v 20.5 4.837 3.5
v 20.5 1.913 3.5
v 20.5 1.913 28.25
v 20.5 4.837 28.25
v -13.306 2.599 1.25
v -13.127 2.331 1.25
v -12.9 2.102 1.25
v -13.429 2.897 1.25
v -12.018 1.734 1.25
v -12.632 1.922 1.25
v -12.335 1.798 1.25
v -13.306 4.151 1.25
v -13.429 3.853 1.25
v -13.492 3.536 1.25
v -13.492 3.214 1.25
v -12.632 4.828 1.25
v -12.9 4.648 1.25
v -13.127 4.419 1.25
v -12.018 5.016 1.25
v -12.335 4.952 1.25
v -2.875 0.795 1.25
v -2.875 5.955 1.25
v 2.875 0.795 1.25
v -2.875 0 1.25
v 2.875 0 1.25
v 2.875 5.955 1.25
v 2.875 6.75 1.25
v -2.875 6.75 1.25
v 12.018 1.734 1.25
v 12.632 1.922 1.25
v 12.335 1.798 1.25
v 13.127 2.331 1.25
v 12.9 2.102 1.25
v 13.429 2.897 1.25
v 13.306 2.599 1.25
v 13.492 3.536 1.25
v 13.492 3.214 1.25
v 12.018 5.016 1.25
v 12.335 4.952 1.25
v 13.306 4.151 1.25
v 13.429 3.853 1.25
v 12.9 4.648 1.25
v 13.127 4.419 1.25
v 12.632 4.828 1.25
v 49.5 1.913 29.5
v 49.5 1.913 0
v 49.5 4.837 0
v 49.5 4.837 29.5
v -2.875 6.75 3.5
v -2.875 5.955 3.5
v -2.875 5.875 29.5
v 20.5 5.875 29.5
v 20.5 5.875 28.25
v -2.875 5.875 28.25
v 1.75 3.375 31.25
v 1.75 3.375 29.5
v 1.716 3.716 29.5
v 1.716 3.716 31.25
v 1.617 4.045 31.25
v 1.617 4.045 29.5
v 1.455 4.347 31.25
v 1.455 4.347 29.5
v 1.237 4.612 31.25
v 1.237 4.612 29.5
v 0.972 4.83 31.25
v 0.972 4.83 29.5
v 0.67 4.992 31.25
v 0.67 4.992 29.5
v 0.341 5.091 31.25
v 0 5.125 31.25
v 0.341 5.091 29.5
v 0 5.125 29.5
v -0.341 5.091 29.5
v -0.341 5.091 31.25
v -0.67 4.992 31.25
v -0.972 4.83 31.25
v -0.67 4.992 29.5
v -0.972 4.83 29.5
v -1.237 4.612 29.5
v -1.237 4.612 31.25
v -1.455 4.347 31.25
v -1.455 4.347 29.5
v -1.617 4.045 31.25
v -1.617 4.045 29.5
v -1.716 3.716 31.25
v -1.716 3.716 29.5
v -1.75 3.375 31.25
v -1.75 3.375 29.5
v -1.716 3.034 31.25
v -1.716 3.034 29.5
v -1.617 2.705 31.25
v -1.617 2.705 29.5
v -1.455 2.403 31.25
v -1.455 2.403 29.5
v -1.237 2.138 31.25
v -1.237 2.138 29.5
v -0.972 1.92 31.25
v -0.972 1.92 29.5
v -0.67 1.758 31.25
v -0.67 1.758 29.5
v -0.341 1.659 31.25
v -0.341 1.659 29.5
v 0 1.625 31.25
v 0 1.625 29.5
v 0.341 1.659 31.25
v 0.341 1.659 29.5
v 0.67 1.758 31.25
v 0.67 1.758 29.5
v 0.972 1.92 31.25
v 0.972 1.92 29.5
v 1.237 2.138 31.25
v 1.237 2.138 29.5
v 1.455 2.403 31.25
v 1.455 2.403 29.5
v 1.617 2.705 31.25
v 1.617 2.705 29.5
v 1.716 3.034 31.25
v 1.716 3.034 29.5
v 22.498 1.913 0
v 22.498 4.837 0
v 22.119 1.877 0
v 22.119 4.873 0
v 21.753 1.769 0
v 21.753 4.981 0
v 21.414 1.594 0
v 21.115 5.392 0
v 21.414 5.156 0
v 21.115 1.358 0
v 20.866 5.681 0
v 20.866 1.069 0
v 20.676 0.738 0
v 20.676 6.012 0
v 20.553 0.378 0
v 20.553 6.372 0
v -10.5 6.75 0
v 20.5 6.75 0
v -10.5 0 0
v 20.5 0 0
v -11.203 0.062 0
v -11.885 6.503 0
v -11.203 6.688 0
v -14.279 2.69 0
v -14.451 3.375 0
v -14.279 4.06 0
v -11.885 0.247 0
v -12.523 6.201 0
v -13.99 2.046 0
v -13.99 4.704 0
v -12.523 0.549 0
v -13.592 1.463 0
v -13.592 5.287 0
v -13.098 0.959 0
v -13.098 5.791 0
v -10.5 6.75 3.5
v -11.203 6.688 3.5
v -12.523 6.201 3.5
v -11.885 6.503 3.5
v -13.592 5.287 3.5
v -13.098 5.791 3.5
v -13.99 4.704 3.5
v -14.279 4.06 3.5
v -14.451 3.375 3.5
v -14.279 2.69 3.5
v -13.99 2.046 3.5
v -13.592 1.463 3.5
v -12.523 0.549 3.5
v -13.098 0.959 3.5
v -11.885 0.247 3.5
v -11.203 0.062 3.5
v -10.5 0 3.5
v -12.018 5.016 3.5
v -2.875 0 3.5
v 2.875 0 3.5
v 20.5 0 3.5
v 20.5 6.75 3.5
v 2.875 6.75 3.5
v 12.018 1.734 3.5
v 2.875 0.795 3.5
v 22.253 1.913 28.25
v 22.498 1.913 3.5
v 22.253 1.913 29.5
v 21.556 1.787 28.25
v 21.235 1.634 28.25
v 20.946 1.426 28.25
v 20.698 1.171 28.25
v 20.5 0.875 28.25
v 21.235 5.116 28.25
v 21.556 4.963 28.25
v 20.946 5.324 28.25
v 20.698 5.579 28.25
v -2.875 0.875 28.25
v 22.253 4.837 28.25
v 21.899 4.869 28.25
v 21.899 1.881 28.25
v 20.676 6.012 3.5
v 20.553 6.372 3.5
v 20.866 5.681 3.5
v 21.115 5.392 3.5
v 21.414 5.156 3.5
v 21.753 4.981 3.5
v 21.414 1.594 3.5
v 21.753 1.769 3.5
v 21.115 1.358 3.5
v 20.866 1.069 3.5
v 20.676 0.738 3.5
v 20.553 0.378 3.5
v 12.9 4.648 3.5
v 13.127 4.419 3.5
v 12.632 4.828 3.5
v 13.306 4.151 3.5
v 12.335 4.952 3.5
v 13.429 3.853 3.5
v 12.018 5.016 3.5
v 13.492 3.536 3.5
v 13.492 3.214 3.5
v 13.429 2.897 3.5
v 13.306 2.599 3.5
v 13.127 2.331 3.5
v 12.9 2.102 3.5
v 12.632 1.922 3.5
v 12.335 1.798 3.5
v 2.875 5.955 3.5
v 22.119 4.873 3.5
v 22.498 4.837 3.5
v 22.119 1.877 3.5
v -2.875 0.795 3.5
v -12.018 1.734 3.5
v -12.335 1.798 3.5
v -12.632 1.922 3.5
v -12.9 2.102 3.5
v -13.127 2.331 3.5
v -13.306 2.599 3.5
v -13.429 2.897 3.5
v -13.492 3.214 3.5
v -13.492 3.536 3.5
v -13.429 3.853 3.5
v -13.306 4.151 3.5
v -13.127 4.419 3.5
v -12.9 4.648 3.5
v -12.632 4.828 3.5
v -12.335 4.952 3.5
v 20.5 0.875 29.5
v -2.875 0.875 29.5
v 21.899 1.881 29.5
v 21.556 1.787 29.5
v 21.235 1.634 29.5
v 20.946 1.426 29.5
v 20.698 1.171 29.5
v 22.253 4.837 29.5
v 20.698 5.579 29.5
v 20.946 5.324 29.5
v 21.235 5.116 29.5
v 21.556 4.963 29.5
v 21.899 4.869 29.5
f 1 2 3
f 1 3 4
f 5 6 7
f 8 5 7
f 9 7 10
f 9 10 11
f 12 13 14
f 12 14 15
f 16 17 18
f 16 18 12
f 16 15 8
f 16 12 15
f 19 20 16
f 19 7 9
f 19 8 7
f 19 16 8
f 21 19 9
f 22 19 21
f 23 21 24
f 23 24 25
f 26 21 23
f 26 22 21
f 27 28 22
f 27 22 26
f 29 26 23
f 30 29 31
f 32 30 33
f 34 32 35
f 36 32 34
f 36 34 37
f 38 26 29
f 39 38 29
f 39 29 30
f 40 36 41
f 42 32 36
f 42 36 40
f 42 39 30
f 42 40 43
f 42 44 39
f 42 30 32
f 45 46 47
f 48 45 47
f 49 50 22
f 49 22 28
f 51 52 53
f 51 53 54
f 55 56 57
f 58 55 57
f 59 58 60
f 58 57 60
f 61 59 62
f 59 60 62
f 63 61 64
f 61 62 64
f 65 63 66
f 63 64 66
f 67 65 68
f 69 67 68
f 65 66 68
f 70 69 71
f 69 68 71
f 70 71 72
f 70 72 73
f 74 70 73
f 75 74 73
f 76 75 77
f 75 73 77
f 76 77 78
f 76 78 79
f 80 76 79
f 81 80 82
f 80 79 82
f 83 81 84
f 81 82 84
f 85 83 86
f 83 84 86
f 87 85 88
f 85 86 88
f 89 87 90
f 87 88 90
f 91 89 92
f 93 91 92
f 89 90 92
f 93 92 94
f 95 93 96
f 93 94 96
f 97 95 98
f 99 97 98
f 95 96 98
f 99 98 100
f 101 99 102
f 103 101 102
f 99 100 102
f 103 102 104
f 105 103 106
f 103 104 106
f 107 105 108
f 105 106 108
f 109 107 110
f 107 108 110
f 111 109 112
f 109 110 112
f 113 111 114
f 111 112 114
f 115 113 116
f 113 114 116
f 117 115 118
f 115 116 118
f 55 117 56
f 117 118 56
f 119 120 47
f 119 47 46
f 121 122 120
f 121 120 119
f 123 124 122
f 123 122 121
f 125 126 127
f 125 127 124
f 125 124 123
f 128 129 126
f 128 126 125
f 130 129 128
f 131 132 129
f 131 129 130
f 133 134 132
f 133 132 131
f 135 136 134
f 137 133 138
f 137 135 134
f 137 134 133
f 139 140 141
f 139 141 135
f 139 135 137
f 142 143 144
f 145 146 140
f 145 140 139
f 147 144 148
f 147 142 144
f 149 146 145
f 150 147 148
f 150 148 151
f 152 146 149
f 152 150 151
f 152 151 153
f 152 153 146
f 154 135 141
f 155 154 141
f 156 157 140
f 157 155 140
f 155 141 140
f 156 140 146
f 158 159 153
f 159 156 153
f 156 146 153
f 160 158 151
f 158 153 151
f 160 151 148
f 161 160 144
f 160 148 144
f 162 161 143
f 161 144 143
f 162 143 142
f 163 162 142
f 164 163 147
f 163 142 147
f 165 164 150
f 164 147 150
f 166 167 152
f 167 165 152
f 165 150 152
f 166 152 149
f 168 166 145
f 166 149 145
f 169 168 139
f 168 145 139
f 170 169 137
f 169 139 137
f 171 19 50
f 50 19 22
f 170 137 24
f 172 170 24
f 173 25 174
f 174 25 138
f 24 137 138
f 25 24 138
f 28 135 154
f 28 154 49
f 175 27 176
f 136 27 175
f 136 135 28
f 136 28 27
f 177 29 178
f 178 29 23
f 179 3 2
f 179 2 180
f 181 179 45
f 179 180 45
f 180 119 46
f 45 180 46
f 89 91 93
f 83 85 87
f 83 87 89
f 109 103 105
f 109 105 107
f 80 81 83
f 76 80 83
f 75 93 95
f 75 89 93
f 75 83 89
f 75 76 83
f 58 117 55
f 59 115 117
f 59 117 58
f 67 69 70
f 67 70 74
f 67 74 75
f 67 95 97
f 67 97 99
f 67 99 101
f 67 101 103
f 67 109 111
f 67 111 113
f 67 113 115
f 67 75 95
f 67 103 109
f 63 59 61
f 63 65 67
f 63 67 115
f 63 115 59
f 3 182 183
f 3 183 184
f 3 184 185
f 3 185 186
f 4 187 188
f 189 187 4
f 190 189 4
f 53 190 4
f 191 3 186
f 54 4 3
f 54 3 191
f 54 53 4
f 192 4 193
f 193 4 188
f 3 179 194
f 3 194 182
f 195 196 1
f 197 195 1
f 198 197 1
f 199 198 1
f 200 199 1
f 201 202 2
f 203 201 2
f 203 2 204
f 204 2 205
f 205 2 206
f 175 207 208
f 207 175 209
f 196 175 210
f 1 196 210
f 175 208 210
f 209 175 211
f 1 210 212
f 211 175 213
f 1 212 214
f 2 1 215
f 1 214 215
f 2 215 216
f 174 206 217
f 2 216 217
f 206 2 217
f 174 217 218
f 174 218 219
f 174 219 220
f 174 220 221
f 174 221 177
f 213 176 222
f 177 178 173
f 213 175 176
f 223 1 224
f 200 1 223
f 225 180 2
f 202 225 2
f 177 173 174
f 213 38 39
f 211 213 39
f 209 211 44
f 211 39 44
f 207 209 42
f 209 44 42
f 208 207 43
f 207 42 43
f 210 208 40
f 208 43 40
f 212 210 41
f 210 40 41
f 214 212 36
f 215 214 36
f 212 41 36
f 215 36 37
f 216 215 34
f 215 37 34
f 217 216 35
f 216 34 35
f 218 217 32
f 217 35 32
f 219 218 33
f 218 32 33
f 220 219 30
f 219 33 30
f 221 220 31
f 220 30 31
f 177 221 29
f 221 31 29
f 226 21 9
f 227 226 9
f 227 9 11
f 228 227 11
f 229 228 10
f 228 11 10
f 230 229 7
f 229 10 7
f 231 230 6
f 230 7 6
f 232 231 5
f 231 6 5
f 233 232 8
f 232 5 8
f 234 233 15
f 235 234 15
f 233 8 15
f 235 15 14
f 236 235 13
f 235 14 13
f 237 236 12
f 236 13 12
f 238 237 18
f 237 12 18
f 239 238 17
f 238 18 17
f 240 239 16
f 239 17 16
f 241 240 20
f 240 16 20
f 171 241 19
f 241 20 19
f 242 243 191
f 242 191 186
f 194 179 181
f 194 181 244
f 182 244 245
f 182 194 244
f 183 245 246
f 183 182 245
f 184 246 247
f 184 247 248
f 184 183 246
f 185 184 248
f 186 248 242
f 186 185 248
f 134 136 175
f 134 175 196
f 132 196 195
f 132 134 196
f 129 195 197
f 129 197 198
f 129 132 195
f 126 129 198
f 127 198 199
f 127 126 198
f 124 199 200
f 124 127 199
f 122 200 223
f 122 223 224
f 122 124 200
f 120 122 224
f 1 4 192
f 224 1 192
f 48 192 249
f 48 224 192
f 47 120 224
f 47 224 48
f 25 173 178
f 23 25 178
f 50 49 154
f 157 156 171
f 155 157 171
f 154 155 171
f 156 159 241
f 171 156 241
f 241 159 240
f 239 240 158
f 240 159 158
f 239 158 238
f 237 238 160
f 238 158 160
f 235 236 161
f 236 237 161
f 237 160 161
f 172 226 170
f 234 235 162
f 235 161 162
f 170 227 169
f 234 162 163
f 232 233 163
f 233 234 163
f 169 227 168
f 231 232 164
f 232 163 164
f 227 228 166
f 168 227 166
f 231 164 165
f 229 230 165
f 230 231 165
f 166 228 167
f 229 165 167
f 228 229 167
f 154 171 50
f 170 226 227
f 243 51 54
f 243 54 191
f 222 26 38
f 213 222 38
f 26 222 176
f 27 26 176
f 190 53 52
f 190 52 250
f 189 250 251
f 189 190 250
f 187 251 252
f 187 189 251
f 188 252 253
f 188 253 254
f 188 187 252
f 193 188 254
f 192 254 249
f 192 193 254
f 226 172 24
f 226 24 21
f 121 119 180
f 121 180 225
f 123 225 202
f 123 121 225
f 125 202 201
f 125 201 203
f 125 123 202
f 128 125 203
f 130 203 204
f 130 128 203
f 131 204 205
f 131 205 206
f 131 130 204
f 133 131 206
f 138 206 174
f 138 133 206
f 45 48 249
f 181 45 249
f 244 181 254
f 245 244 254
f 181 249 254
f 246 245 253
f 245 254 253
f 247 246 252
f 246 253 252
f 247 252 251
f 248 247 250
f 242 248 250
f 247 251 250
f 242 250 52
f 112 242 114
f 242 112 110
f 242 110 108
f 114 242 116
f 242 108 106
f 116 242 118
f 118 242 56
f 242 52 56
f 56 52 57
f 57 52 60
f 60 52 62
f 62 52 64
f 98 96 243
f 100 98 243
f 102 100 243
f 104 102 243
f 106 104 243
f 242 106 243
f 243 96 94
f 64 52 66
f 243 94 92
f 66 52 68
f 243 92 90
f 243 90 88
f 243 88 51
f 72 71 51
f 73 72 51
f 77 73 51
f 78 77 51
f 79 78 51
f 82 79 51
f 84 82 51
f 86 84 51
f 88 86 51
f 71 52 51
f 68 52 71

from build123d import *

# Parameters (mm, degrees)
SKETCH1_W            = 35
SKETCH1_H            = 6.75
BOSS_EXTRUDE10_DEPTH = 3.5
SKETCH1_16_R         = 0.291434634
BOSS_EXTRUDE15_DEPTH = 1.25
SKETCH1_17_W         = 29
SKETCH1_17_H         = 2.924143722
BOSS_EXTRUDE17_DEPTH = 29.5
BOSS_EXTRUDE18_DEPTH = 1.25
SKETCH2_9_R          = 1.75
BOSS_EXTRUDE19_DEPTH = 1.75
FILLET1_R            = 2
FILLET2_R            = 4
SKETCH3_W            = 5.75
SKETCH3_H            = 0.795101344
CUT_EXTRUDE1_DEPTH   = 2.25


with BuildPart() as part:
    # Sketch1 → Boss-Extrude10 (new body)
    with BuildSketch(Plane.XY):
        with Locations((3, 3.375)):
            Rectangle(SKETCH1_W, SKETCH1_H)
        with BuildLine():
            Line((0, 6.25), (12.018477316, 5.016376067))
            ThreePointArc((12.018477316, 5.016376067), (13.5, 3.375), (12.018477316, 1.733623933))
            Line((12.018477316, 1.733623933), (0, 0.5))
            Line((0, 0.5), (-12.018477316, 1.733623933))
            ThreePointArc((-12.018477316, 1.733623933), (-13.5, 3.375), (-12.018477316, 5.016376067))
            Line((-12.018477316, 5.016376067), (0, 6.25))
        make_face(mode=Mode.SUBTRACT)
    extrude(amount=BOSS_EXTRUDE10_DEPTH)

    # Sketch1<16> → Boss-Extrude15 (add)
    # profile 1 of 9: a face of its own
    with BuildSketch(Plane.XY):
        with BuildLine():
            Line((-0.584049273, 6.190050878), (-12.018477316, 5.016376067))
            ThreePointArc((-12.018477316, 5.016376067), (-13.5, 3.375), (-12.018477316, 1.733623933))
            Line((-12.018477316, 1.733623933), (-0.584049273, 0.559949122))
            ThreePointArc((-0.584049273, 0.559949122), (-2.875, 3.375), (-0.584049273, 6.190050878))
        make_face()
        with Locations((-11.85, 3.375)):
            Circle(SKETCH1_16_R, mode=Mode.SUBTRACT)
        with Locations((-9.813185408, 3.375)):
            Circle(SKETCH1_16_R, mode=Mode.SUBTRACT)
        with Locations((-7.776370816, 3.375)):
            Circle(SKETCH1_16_R, mode=Mode.SUBTRACT)
    # profile 2 of 9: a face of its own
    with BuildSketch(Plane.XY):
        with Locations((-11.85, 3.375)):
            Circle(SKETCH1_16_R)
    # profile 3 of 9: a face of its own
    with BuildSketch(Plane.XY):
        with Locations((-7.776370816, 3.375)):
            Circle(SKETCH1_16_R)
    # profile 4 of 9: a face of its own
    with BuildSketch(Plane.XY):
        with Locations((-9.813185408, 3.375)):
            Circle(SKETCH1_16_R)
    # profile 5 of 9: a face of its own
    with BuildSketch(Plane.XY):
        with BuildLine():
            Line((0, 6.25), (-0.584049273, 6.190050878))
            ThreePointArc((-0.584049273, 6.190050878), (-2.875, 3.375), (-0.584049273, 0.559949122))
            Line((-0.584049273, 0.559949122), (0, 0.5))
            Line((0, 0.5), (0.584049273, 0.559949122))
            ThreePointArc((0.584049273, 0.559949122), (2.229884152, 1.56027091), (2.875, 3.375))
            ThreePointArc((2.875, 3.375), (2.229884152, 5.18972909), (0.584049273, 6.190050878))
            Line((0.584049273, 6.190050878), (0, 6.25))
        make_face()
    # profile 6 of 9: a face of its own
    with BuildSketch(Plane.XY):
        with BuildLine():
            Line((12.018477316, 5.016376067), (0.584049273, 6.190050878))
            ThreePointArc((0.584049273, 6.190050878), (2.229884152, 5.18972909), (2.875, 3.375))
            ThreePointArc((2.875, 3.375), (2.229884152, 1.56027091), (0.584049273, 0.559949122))
            Line((0.584049273, 0.559949122), (12.018477316, 1.733623933))
            ThreePointArc((12.018477316, 1.733623933), (13.5, 3.375), (12.018477316, 5.016376067))
        make_face()
        with Locations((7.776370816, 3.375)):
            Circle(SKETCH1_16_R, mode=Mode.SUBTRACT)
        with Locations((9.813185408, 3.375)):
            Circle(SKETCH1_16_R, mode=Mode.SUBTRACT)
        with Locations((11.85, 3.375)):
            Circle(SKETCH1_16_R, mode=Mode.SUBTRACT)
    # profile 7 of 9: a face of its own
    with BuildSketch(Plane.XY):
        with Locations((11.85, 3.375)):
            Circle(SKETCH1_16_R)
    # profile 8 of 9: a face of its own
    with BuildSketch(Plane.XY):
        with Locations((9.813185408, 3.375)):
            Circle(SKETCH1_16_R)
    # profile 9 of 9: a face of its own
    with BuildSketch(Plane.XY):
        with Locations((7.776370816, 3.375)):
            Circle(SKETCH1_16_R)
    extrude(amount=BOSS_EXTRUDE15_DEPTH)

    # Sketch1<17> → Boss-Extrude17 (add)
    with BuildSketch(Plane.XY):
        with Locations((35, 3.375)):
            Rectangle(SKETCH1_17_W, SKETCH1_17_H)
    extrude(amount=BOSS_EXTRUDE17_DEPTH)

    # Sketch2 → Boss-Extrude18 (add)
    with BuildSketch(Plane.XY.offset(29.5)):
        Polygon((14.5, 5.875), (-2.875, 5.875), (-2.875, 0.875), (14.5, 0.875), (20.5, 0.875), (20.5, 5.875), align=None)
    extrude(amount=-BOSS_EXTRUDE18_DEPTH)

    # Sketch2<9> → Boss-Extrude19 (add)
    with BuildSketch(Plane.XY.offset(29.5)):
        with Locations((0, 3.375)):
            Circle(SKETCH2_9_R)
    extrude(amount=BOSS_EXTRUDE19_DEPTH)

    # Fillet1
    # the kernel refuses this fillet: 2 mm, written as the material it adds along each edge
    with BuildSketch(Plane(origin=(20.5, 1.912928139, 0), x_dir=(0, -1, 0), z_dir=(0, 0, 1))) as fillet1_piece_1:
        with BuildLine():
            CenterArc((2, 1.998103724), FILLET1_R, 180, 87.504786267)
            Line((0, 1.998103724), (0, 0))
            Line((0, 0), (1.912928139, 0))
        make_face()
    extrude(amount=3.5)
    with BuildSketch(Plane(origin=(20.5, 4.837071861, 0), x_dir=(0, 1, 0), z_dir=(0, 0, 1))) as fillet1_piece_2:
        with BuildLine():
            CenterArc((2, -1.998103724), FILLET1_R, 92.495213733, 87.504786267)
            Line((0, -1.998103724), (0, 0))
            Line((0, 0), (1.912928139, 0))
        make_face()
    extrude(amount=3.5)
    with BuildSketch(Plane(origin=(20.5, 1.912928139, 28.25), x_dir=(1, 0, 0), z_dir=(0, 0, 1))) as fillet1_piece_3:
        with BuildLine():
            CenterArc((1.753401761, -2), FILLET1_R, 90, 61.246917848)
            Line((0, -1.037928139), (0, 0))
            Line((0, 0), (1.753401761, 0))
        make_face()
    extrude(amount=1.25)
    with BuildSketch(Plane(origin=(20.5, 4.837071861, 28.25), x_dir=(1, 0, 0), z_dir=(0, 0, 1))) as fillet1_piece_4:
        with BuildLine():
            CenterArc((1.753401761, 2), FILLET1_R, 208.753082152, 61.246917848)
            Line((0, 1.037928139), (0, 0))
            Line((0, 0), (1.753401761, 0))
        make_face()
    extrude(amount=1.25)

    # Fillet2
    # the kernel refuses this fillet: 4 mm, written as the material it takes off along each edge
    with BuildSketch(Plane(origin=(-14.5, 6.75, -10), x_dir=(0, -1, 0), z_dir=(0, 0, 1)), Plane(origin=(-14.5, 0, -10), x_dir=(1, 0, 0), z_dir=(0, 0, 1))) as fillet2_piece_1:
        with BuildLine():
            CenterArc((FILLET2_R, FILLET2_R), FILLET2_R, 180, 90)
            Line((0, FILLET2_R), (0, 0))
            Line((0, 0), (FILLET2_R, 0))
        make_face()
    extrude(amount=23.5, mode=Mode.SUBTRACT)

    # Sketch3 → Cut-Extrude1 (cut)
    with BuildSketch(Plane.XY.offset(3.5)):
        with Locations((0, 0.397550672)):
            Rectangle(SKETCH3_W, SKETCH3_H)
        with Locations((0, 6.352449328)):
            Rectangle(SKETCH3_W, SKETCH3_H)
    extrude(amount=-CUT_EXTRUDE1_DEPTH, mode=Mode.SUBTRACT)


solid = part.part
